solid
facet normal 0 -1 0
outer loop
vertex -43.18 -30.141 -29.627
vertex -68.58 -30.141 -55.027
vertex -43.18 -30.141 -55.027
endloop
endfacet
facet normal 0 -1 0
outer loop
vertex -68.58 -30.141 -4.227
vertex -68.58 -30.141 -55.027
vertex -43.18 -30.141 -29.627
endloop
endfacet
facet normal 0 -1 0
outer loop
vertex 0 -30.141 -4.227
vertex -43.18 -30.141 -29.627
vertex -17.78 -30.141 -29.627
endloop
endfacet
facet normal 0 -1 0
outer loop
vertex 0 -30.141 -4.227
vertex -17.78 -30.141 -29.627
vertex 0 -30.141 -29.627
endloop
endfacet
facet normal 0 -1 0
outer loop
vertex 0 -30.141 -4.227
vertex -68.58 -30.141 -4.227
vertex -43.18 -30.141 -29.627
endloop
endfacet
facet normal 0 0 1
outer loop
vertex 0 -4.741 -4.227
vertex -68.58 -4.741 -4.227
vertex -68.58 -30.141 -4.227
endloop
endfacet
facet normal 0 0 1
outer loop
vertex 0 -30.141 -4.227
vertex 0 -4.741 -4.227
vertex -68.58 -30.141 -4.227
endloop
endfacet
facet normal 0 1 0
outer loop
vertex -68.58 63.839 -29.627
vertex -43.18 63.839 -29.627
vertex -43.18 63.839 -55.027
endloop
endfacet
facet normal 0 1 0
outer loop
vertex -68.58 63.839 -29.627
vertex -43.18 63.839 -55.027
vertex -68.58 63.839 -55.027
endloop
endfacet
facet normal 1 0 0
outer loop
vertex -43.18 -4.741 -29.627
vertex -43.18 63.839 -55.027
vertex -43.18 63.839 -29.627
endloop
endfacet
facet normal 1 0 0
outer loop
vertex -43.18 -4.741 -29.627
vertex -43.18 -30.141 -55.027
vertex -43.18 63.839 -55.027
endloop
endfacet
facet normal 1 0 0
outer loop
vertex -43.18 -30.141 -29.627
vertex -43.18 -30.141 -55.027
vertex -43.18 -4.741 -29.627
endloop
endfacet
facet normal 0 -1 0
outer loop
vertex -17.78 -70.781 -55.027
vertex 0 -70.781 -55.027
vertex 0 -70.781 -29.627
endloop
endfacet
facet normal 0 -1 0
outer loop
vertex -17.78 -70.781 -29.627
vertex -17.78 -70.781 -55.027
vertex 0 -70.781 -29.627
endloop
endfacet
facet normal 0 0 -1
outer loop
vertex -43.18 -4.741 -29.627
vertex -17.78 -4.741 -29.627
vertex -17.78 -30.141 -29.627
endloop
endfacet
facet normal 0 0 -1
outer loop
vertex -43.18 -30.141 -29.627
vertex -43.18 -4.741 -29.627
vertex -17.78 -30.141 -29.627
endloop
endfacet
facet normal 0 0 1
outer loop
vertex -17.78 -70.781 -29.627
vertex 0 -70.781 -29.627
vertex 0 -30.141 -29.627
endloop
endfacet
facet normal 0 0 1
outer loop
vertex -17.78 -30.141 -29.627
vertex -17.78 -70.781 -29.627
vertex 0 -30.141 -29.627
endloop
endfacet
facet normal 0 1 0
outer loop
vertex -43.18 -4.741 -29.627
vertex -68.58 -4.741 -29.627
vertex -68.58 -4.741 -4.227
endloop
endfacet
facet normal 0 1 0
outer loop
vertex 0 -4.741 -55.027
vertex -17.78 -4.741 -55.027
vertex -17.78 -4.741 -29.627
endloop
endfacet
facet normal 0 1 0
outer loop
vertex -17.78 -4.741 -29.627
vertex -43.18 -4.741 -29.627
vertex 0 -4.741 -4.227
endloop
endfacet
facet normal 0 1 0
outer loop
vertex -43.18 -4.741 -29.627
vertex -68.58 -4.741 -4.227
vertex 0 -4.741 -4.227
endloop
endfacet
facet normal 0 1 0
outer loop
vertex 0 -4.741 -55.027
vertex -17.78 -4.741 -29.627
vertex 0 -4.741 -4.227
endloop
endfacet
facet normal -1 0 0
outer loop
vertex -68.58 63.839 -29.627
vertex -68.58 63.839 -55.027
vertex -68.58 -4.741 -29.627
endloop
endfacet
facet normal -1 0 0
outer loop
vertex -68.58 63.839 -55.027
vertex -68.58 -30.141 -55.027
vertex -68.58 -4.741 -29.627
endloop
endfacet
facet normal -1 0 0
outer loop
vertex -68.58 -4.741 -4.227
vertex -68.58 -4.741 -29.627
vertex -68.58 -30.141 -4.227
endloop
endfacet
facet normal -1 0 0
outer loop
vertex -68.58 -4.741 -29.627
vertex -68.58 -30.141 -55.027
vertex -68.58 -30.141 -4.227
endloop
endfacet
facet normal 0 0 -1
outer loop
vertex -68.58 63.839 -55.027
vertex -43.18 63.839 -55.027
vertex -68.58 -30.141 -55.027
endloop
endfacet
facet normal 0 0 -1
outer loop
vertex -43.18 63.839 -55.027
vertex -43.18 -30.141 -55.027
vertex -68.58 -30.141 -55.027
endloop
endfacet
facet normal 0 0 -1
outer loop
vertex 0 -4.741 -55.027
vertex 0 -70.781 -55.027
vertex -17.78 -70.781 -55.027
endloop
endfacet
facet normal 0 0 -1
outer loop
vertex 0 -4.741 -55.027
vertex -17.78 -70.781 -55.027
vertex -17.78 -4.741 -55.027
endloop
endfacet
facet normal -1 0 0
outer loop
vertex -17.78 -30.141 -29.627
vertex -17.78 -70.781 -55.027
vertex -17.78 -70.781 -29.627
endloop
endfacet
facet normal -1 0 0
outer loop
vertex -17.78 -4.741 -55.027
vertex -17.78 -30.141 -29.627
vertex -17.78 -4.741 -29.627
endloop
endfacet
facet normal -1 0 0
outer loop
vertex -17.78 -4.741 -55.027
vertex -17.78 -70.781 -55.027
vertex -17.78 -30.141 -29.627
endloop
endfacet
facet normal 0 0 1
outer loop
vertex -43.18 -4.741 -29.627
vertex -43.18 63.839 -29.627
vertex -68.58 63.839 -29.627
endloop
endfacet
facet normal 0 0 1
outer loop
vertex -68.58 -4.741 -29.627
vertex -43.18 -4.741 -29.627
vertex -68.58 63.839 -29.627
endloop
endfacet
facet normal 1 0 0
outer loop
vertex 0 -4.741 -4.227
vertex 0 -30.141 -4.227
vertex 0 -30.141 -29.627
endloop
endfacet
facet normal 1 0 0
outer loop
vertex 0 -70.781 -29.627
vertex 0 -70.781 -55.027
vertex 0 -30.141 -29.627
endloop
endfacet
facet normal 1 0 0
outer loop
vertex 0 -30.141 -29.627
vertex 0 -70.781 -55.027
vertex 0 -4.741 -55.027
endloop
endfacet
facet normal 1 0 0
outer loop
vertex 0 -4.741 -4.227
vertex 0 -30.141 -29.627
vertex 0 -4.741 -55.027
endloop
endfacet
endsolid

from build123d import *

# Parameters (mm, degrees)
F0_W     = 66.04
F0_H     = 25.4
F1_DEPTH = 17.78
F2_W     = 17.78
F2_H     = 25.4
F3_DEPTH = 25.4
F4_W     = 25.4
F4_H     = 25.4
F5_DEPTH = 50.8
F6_W     = 25.4
F6_H     = 25.4
F7_DEPTH = 25.4
F8_W     = 25.4
F8_H     = 25.4
F9_DEPTH = 68.58


with BuildPart() as f1:
    # F0 (on Right) → F1 (new body)
    with BuildSketch(Plane.YZ):
        with Locations((-37.761463, -42.327177)):
            Rectangle(F0_W, F0_H)
    extrude(amount=-F1_DEPTH)

    # F2 (on face) → F3 (join)
    with BuildSketch(Plane.XY.offset(-29.627177)):
        with Locations((-8.89, -17.441463)):
            Rectangle(F2_W, F2_H)
    extrude(amount=F3_DEPTH)

    # F4 (on face) → F5 (join)
    with BuildSketch(Plane(origin=(-17.78, 0, 0), x_dir=(0, -1, 0), z_dir=(-1, 0, 0))):
        with Locations((17.441463, -16.927177)):
            Rectangle(F4_W, F4_H)
    extrude(amount=F5_DEPTH)

    # F6 (on face) → F7 (join)
    with BuildSketch(Plane(origin=(0, 0, -29.627177), x_dir=(1, 0, 0), z_dir=(0, 0, -1))):
        with Locations((-55.88, 17.441463)):
            Rectangle(F6_W, F6_H)
    extrude(amount=F7_DEPTH)

    # F8 (on face) → F9 (join)
    with BuildSketch(Plane(origin=(0, -4.741463, 0), x_dir=(-1, 0, 0), z_dir=(0, 1, 0))):
        with Locations((55.88, -42.327177)):
            Rectangle(F8_W, F8_H)
    extrude(amount=F9_DEPTH)


solid = f1.part
